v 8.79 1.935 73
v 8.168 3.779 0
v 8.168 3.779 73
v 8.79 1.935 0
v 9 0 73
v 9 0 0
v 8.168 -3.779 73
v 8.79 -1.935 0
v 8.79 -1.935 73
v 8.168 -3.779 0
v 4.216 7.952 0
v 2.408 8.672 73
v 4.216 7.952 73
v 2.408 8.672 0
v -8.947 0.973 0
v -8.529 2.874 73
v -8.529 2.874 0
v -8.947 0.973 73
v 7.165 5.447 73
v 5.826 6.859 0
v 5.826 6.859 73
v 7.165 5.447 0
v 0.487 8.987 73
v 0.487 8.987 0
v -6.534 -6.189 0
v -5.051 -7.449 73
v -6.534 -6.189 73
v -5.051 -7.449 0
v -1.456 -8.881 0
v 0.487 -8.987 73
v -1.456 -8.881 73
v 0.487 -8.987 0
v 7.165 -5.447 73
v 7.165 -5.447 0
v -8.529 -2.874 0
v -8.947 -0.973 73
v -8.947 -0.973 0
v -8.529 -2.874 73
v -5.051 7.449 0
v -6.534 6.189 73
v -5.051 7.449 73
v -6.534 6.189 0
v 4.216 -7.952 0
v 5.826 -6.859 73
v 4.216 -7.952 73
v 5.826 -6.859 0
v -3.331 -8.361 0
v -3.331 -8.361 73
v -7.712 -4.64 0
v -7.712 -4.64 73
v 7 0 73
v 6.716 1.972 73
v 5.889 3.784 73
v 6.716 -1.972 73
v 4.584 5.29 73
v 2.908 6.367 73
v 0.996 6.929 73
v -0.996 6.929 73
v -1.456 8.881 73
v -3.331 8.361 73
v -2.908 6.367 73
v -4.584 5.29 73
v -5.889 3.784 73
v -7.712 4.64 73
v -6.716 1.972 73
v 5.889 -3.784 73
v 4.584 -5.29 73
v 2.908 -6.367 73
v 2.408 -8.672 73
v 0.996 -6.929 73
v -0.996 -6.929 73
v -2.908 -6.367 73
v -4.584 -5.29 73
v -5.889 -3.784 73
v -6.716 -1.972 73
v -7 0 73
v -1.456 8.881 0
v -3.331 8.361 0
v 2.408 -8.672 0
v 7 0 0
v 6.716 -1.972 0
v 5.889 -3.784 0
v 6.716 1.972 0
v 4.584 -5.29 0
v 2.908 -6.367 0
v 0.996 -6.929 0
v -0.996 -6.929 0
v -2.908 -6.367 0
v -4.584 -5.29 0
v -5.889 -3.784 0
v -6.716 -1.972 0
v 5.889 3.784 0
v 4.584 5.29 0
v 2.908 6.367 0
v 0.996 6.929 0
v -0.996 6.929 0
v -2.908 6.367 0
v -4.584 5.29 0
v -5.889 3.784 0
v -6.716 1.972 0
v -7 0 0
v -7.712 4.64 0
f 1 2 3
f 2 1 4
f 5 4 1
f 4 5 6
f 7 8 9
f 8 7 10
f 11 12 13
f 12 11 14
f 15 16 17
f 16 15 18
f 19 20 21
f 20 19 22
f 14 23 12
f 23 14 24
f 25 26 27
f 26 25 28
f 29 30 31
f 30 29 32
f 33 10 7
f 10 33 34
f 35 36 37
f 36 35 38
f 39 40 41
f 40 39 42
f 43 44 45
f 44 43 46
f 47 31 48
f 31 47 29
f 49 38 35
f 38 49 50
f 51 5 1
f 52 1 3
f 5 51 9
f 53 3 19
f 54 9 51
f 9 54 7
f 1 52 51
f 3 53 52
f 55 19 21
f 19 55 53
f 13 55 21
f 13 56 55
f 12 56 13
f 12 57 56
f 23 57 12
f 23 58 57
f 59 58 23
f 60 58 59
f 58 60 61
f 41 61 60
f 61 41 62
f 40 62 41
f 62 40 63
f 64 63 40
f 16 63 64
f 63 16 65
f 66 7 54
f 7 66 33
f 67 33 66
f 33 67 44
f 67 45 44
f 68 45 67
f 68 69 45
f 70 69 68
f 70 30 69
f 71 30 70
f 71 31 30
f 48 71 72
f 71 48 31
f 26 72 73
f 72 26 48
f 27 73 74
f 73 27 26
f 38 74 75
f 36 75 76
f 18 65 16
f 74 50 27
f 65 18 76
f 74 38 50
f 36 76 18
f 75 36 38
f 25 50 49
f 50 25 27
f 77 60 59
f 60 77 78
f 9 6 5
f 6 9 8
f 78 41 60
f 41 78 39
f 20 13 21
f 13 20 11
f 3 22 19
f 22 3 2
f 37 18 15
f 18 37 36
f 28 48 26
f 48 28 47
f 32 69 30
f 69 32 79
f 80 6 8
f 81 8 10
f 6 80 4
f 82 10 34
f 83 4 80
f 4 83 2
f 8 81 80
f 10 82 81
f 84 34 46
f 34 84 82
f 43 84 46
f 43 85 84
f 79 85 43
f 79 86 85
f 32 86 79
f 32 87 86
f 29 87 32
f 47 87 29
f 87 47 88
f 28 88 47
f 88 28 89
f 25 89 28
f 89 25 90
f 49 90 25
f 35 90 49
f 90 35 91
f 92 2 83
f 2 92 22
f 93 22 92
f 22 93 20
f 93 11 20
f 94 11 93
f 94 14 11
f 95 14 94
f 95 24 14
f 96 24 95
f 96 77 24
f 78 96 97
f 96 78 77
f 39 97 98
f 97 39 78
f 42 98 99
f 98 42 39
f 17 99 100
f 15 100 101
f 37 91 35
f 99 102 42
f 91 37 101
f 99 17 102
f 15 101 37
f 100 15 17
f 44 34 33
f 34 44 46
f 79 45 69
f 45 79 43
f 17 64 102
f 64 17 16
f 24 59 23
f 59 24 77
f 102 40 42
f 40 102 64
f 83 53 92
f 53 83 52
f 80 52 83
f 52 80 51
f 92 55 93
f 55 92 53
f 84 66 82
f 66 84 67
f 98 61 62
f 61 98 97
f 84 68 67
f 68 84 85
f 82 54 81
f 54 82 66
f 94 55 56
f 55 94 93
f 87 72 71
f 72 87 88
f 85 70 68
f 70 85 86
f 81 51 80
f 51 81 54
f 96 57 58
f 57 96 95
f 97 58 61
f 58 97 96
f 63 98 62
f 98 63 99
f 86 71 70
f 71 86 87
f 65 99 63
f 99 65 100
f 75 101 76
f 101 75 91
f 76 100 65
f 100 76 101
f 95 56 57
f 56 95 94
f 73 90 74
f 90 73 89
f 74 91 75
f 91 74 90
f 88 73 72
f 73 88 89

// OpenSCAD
difference() {
  cylinder(h=73, r1=9, r2=9);
  cylinder(h=73, r1=7, r2=7);
}
